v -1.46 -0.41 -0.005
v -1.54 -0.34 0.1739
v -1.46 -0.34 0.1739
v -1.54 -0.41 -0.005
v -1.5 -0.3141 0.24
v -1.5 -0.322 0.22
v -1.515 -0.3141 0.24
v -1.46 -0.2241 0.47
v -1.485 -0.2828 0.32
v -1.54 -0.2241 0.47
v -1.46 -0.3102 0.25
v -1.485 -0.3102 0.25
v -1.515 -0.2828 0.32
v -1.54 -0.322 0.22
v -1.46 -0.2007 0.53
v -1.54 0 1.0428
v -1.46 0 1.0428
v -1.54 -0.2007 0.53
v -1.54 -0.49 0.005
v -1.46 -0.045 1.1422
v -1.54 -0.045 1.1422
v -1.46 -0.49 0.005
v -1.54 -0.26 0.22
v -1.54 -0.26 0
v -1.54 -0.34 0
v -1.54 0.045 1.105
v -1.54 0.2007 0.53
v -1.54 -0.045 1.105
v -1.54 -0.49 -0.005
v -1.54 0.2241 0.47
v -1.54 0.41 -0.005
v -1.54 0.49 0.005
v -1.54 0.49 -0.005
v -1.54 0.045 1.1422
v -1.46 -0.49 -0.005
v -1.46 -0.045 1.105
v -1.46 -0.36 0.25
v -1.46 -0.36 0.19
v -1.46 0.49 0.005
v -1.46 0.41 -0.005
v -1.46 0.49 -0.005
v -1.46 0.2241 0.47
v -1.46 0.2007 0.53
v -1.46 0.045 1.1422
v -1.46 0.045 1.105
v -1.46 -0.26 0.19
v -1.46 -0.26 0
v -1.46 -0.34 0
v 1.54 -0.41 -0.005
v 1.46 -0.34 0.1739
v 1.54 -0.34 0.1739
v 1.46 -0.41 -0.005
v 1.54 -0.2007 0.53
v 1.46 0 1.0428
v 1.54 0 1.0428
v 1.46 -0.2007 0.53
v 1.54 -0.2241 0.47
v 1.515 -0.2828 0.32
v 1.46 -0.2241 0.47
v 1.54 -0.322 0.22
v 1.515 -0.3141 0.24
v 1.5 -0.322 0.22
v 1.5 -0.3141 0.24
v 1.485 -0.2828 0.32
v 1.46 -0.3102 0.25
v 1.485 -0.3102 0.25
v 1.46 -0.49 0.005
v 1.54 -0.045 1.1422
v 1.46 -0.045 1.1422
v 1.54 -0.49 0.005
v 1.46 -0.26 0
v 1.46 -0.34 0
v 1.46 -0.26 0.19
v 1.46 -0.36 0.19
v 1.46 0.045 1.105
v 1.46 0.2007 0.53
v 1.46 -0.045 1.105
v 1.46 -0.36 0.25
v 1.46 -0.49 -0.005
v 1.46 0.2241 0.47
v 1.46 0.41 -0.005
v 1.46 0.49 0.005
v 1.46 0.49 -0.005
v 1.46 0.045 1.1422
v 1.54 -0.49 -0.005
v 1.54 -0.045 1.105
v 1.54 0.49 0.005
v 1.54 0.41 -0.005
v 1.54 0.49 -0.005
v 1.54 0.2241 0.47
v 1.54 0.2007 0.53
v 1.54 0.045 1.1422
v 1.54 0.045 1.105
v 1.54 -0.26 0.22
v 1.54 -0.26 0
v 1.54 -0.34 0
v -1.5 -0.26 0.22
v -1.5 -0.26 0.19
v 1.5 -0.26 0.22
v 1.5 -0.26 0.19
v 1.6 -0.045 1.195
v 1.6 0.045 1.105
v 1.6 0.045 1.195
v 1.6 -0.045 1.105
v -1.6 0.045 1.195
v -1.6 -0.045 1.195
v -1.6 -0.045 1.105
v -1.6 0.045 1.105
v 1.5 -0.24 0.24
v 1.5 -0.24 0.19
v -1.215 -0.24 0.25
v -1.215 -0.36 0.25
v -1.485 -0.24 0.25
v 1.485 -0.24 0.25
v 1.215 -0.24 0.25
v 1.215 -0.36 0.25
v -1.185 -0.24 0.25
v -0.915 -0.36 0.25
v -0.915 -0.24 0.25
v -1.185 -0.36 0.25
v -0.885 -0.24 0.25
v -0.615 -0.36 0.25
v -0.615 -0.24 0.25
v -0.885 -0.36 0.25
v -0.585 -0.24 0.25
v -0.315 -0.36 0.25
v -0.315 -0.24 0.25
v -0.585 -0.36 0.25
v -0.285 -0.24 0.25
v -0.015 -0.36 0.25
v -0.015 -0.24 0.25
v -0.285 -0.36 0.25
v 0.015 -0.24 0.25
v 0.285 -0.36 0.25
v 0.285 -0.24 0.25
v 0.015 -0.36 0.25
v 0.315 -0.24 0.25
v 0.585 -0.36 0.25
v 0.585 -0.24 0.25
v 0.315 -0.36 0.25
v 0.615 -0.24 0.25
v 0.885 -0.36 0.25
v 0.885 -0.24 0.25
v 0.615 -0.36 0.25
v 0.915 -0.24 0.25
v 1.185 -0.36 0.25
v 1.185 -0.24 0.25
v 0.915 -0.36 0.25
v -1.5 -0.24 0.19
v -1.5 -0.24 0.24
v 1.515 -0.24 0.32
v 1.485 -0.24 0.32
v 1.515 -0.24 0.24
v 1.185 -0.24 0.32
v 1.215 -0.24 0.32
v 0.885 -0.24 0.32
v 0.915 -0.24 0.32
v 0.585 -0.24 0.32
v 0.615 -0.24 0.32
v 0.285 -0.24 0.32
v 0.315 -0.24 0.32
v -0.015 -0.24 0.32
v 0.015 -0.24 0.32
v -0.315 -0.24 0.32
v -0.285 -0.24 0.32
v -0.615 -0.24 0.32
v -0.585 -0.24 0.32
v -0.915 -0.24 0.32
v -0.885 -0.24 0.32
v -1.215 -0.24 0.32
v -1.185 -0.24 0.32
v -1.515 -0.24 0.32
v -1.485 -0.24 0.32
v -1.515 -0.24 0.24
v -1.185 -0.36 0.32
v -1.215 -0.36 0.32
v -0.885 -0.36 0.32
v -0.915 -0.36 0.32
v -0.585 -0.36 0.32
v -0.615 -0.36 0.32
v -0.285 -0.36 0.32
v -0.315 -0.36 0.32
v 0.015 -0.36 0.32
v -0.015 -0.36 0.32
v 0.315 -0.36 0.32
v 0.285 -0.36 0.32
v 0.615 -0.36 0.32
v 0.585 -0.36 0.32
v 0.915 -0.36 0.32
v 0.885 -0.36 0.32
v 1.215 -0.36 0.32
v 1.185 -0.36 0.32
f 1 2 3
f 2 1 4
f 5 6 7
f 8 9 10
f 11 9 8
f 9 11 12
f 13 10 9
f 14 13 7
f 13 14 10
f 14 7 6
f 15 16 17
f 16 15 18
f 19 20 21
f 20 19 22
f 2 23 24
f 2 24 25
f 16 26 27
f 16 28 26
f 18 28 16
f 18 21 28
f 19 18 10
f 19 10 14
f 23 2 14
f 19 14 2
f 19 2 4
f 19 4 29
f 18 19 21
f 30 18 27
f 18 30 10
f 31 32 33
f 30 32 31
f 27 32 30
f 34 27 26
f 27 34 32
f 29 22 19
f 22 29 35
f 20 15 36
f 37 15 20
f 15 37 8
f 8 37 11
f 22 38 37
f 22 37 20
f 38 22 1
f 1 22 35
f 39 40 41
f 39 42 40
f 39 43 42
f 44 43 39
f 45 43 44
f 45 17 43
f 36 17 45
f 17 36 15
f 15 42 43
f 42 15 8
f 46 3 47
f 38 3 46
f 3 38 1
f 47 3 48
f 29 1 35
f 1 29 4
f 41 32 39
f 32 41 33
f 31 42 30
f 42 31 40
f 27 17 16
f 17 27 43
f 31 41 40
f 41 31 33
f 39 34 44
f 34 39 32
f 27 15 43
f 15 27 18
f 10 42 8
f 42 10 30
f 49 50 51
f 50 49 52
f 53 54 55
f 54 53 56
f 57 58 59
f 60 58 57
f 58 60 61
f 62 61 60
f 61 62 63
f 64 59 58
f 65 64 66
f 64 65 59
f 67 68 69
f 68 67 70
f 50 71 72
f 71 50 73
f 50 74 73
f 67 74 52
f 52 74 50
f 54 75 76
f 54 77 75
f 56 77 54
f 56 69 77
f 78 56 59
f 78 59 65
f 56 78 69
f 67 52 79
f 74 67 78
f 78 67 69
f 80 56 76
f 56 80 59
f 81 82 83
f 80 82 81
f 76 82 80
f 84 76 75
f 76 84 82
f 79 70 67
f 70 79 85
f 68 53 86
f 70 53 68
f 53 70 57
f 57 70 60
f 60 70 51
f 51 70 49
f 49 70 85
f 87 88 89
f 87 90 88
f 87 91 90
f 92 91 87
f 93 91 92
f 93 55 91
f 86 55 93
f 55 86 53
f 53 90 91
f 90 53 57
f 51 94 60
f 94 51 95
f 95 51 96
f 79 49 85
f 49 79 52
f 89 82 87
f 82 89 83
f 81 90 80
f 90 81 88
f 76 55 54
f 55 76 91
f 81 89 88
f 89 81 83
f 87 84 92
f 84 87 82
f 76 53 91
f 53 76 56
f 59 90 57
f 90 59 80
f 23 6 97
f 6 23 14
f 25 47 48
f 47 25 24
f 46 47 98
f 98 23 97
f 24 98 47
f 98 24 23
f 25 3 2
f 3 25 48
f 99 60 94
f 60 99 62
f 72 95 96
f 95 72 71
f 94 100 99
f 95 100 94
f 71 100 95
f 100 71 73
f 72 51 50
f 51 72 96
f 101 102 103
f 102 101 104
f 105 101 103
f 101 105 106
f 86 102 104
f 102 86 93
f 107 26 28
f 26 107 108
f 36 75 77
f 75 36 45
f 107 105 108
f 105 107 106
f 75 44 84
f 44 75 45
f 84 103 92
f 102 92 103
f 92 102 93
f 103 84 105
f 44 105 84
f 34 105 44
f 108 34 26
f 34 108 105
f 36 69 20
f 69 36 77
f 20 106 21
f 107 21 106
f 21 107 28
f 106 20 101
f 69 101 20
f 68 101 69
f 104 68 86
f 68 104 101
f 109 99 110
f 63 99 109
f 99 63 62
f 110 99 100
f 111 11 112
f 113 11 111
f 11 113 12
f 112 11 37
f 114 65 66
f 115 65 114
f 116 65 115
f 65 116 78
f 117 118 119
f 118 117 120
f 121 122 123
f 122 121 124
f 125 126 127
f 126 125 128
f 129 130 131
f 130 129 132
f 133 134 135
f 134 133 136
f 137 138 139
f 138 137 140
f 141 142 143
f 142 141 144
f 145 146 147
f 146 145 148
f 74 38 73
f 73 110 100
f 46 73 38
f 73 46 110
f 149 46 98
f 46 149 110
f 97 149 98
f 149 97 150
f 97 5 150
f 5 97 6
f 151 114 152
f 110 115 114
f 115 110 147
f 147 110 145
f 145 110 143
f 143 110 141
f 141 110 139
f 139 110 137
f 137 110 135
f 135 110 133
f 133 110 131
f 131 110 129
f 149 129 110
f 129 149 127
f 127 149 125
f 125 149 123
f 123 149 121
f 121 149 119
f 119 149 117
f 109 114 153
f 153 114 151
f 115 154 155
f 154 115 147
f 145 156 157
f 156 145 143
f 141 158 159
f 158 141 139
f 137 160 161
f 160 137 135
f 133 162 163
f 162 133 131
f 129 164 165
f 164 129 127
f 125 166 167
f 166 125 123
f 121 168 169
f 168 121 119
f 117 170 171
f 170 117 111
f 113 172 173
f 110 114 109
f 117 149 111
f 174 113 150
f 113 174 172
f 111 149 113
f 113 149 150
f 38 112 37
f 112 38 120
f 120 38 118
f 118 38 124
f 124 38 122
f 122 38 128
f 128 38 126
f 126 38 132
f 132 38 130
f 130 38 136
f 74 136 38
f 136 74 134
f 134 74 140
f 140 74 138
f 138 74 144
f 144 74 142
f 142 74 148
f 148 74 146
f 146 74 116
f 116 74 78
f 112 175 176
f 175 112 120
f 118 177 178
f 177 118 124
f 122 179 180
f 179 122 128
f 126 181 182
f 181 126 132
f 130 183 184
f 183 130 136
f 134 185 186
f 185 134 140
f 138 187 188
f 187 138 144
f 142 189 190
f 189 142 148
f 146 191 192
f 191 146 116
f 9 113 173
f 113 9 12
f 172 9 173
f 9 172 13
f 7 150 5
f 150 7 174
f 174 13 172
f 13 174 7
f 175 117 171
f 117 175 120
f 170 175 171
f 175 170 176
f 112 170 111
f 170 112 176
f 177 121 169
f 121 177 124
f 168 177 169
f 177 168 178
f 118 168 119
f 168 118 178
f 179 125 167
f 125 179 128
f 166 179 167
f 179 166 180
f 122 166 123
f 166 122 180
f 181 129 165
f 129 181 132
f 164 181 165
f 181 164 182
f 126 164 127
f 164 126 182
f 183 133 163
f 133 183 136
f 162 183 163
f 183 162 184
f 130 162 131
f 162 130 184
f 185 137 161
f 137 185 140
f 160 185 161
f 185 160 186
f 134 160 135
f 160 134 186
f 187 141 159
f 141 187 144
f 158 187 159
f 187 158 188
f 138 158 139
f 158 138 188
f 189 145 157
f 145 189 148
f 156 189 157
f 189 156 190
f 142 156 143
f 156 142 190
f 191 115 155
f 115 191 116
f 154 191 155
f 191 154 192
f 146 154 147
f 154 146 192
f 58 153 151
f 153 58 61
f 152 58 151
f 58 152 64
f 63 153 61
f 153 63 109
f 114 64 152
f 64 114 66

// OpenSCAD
// Ski rack — a wooden A-frame rack for ten pairs of skis, set on the snow
// by a lodge door.
//
// A top rail at shoulder height on an A-frame at each end, and a slotted
// foot rail low down in front (−Y) where the tails stand; skis lean back
// against the top rail. The game stands each pair in front of the rail
// (world.Building.SkiRackSlot: 0.3 m apart along X, 0.3 m out on the
// front side).
//
// Conventions, units, and axis docs: see models-src/README.md.

$fn = 8;

len_x    = 3.2;   // rail length
rail_h   = 1.15;  // top rail height
rail_w   = 0.09;  // rail cross-section
leg_w    = 0.08;
leg_foot = 0.45;  // how far each A-frame leg spreads from the centre line
foot_h   = 0.22;  // foot rail height
foot_y   = 0.30;  // foot rail distance in front of the top rail
slot_n   = 10;
slot_pitch = 0.3;

wood  = [0.55, 0.38, 0.22];
dark  = [0.32, 0.22, 0.14];

echo("MOGUL_META", "footprint", len_x / 2 + 0.1, 0.55);

// One leg of an A-frame from the ground at (x, y) up to the rail.
module leg(x, y) {
    hull() {
        translate([x, y, 0]) cube([leg_w, leg_w, 0.01], center = true);
        translate([x, 0, rail_h]) cube([leg_w, leg_w, 0.01], center = true);
    }
}

color(wood) {
    // Top rail.
    translate([0, 0, rail_h]) cube([len_x, rail_w, rail_w], center = true);
    // A-frames at both ends.
    for (x = [-len_x / 2 + 0.1, len_x / 2 - 0.1]) {
        leg(x, -leg_foot);
        leg(x, leg_foot);
        // Cross brace.
        translate([x, 0, 0.5]) cube([leg_w, leg_foot * 1.1, 0.06], center = true);
    }
    // Foot rail in front, on short posts.
    translate([0, -foot_y, foot_h]) cube([len_x - 0.2, 0.12, 0.06], center = true);
    for (x = [-len_x / 2 + 0.1, len_x / 2 - 0.1])
        translate([x, -foot_y, foot_h / 2]) cube([leg_w, leg_w, foot_h], center = true);
}

// Slot dividers on the foot rail, one either side of each pair.
color(dark)
for (i = [0 : slot_n]) {
    x = (i - slot_n / 2) * slot_pitch;
    translate([x, -foot_y, foot_h + 0.06]) cube([0.03, 0.12, 0.08], center = true);
}
